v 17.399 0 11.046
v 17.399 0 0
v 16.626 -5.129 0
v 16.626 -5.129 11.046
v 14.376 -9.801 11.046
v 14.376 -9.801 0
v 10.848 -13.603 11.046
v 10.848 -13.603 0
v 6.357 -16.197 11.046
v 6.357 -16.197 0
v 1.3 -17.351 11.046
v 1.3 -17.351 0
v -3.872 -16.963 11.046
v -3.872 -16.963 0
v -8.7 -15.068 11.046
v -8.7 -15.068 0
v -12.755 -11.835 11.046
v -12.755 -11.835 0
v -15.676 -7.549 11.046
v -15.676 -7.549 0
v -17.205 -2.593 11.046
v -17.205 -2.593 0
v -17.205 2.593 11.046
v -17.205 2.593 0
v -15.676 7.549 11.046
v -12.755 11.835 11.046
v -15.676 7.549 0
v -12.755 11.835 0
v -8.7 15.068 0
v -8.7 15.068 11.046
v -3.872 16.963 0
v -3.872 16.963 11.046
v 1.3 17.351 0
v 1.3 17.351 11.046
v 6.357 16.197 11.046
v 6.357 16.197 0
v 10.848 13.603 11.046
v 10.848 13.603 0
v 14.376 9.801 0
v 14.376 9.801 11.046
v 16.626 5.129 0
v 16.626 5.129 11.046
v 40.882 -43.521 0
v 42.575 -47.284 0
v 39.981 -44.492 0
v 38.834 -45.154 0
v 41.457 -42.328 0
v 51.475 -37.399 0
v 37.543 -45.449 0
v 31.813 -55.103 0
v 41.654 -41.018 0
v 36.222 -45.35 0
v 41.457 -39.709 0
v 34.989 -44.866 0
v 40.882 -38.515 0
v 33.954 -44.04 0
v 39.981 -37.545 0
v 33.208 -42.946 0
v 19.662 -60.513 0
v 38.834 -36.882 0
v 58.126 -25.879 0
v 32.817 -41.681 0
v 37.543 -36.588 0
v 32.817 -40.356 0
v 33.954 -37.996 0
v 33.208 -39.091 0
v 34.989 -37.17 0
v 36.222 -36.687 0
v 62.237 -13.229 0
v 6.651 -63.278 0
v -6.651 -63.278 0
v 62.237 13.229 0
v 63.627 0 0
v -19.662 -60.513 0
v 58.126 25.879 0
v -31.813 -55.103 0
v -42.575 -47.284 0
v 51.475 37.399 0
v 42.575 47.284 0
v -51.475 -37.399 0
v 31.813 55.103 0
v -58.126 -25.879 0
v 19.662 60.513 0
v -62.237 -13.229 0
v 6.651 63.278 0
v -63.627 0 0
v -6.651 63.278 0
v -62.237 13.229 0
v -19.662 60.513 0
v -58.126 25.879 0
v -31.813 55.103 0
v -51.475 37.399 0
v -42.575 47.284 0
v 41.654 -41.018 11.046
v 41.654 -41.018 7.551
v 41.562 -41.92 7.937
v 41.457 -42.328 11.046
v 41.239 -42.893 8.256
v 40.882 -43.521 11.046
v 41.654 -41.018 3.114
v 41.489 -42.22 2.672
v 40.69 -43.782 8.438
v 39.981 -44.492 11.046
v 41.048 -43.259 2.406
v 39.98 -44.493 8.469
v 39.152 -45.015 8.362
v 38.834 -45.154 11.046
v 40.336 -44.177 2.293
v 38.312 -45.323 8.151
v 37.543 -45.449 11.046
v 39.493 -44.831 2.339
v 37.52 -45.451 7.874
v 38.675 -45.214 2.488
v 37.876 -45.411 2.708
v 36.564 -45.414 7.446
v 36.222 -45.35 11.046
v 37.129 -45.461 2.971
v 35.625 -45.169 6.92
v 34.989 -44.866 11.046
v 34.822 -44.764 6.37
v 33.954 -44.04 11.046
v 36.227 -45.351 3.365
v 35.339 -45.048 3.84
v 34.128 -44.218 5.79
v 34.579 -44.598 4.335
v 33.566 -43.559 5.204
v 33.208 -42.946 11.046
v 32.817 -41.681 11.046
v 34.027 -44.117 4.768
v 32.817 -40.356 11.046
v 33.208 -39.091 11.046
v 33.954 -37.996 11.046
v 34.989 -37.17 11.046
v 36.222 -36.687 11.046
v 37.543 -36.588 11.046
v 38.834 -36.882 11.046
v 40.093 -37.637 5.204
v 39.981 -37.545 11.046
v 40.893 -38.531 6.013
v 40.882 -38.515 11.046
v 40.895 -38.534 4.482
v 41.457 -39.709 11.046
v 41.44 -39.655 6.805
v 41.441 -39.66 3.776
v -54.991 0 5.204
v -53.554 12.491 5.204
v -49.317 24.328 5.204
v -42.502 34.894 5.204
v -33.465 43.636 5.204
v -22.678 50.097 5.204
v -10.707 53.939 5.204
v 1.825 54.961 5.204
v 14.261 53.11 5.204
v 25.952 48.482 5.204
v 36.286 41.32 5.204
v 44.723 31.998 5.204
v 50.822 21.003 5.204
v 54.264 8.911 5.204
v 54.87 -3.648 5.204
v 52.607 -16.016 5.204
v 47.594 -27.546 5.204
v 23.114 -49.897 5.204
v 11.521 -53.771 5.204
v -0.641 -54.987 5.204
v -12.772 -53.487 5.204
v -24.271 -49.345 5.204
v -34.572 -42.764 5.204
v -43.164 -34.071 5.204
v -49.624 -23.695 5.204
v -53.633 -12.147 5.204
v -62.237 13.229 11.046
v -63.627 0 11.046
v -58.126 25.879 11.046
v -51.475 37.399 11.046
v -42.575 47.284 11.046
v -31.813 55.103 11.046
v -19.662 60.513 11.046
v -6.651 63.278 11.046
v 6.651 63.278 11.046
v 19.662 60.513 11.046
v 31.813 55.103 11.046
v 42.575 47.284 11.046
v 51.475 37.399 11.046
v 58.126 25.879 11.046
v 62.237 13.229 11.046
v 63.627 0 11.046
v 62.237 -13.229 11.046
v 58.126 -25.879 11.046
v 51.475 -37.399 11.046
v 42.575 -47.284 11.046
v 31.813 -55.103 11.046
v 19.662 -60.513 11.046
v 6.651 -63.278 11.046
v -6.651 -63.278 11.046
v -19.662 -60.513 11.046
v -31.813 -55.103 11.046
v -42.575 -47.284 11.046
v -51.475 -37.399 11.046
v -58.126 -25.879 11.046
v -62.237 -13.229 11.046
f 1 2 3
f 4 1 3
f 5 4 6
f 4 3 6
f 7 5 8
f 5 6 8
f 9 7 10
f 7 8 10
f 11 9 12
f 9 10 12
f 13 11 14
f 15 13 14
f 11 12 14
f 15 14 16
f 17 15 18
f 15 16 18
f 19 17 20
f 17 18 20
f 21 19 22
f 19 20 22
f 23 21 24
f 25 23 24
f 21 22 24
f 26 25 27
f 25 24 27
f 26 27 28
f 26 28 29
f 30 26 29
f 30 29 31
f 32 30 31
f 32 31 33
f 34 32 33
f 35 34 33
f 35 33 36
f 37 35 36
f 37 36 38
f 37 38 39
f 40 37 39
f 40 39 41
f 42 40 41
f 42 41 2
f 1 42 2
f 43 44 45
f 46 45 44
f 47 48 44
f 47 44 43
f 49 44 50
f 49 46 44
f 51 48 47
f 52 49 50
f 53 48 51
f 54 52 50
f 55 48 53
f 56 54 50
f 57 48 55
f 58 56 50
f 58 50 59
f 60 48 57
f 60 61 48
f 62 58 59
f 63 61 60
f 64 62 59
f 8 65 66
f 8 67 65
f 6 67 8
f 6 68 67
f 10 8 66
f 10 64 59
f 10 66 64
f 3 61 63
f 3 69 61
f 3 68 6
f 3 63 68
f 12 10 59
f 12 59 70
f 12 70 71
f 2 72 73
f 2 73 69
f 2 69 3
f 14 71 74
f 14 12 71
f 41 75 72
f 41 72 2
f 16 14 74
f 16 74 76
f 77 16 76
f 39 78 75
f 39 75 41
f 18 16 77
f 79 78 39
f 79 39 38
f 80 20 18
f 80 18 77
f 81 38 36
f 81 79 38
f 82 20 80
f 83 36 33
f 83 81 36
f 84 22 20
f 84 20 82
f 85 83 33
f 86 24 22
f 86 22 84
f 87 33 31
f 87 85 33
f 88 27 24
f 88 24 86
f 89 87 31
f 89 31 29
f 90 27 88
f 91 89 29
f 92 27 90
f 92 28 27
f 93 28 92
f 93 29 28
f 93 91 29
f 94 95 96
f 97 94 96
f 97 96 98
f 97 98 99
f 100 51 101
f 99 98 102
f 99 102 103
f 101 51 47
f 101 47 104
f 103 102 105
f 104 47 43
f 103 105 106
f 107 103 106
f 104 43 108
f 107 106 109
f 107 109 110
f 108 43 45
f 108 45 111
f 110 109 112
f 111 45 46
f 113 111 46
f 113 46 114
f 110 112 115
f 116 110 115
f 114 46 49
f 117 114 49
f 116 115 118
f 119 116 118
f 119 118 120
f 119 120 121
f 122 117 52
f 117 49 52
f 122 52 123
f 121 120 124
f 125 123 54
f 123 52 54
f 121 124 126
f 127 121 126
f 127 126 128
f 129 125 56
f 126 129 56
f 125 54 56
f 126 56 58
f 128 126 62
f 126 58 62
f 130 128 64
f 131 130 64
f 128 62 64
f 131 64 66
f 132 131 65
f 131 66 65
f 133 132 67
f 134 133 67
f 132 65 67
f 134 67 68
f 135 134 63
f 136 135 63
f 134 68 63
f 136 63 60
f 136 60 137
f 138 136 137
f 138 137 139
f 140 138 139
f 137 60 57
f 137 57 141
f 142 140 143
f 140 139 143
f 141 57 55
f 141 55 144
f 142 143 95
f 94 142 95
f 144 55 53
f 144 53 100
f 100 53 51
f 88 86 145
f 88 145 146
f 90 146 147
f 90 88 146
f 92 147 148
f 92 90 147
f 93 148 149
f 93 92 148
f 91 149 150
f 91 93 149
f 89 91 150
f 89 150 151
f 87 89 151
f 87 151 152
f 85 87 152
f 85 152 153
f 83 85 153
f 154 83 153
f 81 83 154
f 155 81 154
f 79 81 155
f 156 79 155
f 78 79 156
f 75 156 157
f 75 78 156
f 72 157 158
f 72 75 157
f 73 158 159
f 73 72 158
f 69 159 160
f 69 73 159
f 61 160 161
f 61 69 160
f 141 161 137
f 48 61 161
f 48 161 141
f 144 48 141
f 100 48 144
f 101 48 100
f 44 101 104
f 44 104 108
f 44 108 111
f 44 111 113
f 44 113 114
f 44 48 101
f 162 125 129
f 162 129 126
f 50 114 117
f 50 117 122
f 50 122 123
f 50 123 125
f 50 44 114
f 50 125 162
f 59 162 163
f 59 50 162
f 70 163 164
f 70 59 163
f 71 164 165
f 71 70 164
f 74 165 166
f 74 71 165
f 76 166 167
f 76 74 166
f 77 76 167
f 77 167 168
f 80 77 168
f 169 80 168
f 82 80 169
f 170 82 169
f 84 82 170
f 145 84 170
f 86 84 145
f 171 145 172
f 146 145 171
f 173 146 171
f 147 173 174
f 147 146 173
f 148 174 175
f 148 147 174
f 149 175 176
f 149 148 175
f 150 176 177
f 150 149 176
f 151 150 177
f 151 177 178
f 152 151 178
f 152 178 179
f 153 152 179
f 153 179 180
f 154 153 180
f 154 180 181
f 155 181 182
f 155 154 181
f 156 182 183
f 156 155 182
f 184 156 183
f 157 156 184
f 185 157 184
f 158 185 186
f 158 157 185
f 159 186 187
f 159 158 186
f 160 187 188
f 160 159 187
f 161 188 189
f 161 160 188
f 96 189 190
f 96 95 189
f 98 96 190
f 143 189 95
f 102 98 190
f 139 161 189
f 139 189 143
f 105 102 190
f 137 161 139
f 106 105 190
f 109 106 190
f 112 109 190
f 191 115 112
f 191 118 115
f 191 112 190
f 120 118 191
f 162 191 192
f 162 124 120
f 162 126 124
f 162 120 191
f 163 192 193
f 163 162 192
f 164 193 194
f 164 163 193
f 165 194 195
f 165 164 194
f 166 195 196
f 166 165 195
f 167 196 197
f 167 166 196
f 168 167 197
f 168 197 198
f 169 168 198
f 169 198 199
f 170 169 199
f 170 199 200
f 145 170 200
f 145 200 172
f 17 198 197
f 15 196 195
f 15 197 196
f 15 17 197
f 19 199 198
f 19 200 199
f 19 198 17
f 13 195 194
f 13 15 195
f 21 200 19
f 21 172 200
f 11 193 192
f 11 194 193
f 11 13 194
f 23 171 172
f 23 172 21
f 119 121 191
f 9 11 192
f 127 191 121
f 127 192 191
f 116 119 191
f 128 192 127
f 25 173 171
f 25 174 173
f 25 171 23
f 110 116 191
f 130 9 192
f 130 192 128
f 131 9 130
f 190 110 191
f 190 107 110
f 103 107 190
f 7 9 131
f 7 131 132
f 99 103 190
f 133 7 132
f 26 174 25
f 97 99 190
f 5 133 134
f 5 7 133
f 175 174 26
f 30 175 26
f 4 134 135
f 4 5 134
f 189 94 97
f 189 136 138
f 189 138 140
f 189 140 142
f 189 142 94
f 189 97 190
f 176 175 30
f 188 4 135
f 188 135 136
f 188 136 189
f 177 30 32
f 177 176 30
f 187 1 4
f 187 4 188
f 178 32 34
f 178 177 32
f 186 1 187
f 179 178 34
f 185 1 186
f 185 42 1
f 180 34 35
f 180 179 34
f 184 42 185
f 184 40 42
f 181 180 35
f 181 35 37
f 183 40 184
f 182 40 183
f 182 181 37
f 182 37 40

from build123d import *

# Parameters (mm, degrees)
F2_R     = 4.443183
F3_DEPTH = 25.4
F4_R     = 17.399446
F5_DEPTH = 25.4


with BuildPart() as f1:
    # F0 (on Front) → F1 (revolve)
    with BuildSketch(Plane.XZ):
        Polygon((-63.626997, 0), (0, 0), (0, 11.046355), (-63.626997, 11.046355), (-54.990999, 5.204355), align=None)
    revolve(axis=Axis((0, 0, 5.523177), (0, 0, -1)))

    # F2 (on face) → F3 (cut)
    with BuildSketch(Plane(origin=(0, 0, 0), x_dir=(1, 0, 0), z_dir=(0, 0, -1))):
        with Locations((37.211001, 41.018352)):
            Circle(F2_R)
    extrude(amount=-F3_DEPTH, mode=Mode.SUBTRACT)

    # F4 (on face) → F5 (cut)
    with BuildSketch(Plane(origin=(0, 0, 0), x_dir=(1, 0, 0), z_dir=(0, 0, -1))):
        Circle(F4_R)
    extrude(amount=-F5_DEPTH, mode=Mode.SUBTRACT)


solid = f1.part
